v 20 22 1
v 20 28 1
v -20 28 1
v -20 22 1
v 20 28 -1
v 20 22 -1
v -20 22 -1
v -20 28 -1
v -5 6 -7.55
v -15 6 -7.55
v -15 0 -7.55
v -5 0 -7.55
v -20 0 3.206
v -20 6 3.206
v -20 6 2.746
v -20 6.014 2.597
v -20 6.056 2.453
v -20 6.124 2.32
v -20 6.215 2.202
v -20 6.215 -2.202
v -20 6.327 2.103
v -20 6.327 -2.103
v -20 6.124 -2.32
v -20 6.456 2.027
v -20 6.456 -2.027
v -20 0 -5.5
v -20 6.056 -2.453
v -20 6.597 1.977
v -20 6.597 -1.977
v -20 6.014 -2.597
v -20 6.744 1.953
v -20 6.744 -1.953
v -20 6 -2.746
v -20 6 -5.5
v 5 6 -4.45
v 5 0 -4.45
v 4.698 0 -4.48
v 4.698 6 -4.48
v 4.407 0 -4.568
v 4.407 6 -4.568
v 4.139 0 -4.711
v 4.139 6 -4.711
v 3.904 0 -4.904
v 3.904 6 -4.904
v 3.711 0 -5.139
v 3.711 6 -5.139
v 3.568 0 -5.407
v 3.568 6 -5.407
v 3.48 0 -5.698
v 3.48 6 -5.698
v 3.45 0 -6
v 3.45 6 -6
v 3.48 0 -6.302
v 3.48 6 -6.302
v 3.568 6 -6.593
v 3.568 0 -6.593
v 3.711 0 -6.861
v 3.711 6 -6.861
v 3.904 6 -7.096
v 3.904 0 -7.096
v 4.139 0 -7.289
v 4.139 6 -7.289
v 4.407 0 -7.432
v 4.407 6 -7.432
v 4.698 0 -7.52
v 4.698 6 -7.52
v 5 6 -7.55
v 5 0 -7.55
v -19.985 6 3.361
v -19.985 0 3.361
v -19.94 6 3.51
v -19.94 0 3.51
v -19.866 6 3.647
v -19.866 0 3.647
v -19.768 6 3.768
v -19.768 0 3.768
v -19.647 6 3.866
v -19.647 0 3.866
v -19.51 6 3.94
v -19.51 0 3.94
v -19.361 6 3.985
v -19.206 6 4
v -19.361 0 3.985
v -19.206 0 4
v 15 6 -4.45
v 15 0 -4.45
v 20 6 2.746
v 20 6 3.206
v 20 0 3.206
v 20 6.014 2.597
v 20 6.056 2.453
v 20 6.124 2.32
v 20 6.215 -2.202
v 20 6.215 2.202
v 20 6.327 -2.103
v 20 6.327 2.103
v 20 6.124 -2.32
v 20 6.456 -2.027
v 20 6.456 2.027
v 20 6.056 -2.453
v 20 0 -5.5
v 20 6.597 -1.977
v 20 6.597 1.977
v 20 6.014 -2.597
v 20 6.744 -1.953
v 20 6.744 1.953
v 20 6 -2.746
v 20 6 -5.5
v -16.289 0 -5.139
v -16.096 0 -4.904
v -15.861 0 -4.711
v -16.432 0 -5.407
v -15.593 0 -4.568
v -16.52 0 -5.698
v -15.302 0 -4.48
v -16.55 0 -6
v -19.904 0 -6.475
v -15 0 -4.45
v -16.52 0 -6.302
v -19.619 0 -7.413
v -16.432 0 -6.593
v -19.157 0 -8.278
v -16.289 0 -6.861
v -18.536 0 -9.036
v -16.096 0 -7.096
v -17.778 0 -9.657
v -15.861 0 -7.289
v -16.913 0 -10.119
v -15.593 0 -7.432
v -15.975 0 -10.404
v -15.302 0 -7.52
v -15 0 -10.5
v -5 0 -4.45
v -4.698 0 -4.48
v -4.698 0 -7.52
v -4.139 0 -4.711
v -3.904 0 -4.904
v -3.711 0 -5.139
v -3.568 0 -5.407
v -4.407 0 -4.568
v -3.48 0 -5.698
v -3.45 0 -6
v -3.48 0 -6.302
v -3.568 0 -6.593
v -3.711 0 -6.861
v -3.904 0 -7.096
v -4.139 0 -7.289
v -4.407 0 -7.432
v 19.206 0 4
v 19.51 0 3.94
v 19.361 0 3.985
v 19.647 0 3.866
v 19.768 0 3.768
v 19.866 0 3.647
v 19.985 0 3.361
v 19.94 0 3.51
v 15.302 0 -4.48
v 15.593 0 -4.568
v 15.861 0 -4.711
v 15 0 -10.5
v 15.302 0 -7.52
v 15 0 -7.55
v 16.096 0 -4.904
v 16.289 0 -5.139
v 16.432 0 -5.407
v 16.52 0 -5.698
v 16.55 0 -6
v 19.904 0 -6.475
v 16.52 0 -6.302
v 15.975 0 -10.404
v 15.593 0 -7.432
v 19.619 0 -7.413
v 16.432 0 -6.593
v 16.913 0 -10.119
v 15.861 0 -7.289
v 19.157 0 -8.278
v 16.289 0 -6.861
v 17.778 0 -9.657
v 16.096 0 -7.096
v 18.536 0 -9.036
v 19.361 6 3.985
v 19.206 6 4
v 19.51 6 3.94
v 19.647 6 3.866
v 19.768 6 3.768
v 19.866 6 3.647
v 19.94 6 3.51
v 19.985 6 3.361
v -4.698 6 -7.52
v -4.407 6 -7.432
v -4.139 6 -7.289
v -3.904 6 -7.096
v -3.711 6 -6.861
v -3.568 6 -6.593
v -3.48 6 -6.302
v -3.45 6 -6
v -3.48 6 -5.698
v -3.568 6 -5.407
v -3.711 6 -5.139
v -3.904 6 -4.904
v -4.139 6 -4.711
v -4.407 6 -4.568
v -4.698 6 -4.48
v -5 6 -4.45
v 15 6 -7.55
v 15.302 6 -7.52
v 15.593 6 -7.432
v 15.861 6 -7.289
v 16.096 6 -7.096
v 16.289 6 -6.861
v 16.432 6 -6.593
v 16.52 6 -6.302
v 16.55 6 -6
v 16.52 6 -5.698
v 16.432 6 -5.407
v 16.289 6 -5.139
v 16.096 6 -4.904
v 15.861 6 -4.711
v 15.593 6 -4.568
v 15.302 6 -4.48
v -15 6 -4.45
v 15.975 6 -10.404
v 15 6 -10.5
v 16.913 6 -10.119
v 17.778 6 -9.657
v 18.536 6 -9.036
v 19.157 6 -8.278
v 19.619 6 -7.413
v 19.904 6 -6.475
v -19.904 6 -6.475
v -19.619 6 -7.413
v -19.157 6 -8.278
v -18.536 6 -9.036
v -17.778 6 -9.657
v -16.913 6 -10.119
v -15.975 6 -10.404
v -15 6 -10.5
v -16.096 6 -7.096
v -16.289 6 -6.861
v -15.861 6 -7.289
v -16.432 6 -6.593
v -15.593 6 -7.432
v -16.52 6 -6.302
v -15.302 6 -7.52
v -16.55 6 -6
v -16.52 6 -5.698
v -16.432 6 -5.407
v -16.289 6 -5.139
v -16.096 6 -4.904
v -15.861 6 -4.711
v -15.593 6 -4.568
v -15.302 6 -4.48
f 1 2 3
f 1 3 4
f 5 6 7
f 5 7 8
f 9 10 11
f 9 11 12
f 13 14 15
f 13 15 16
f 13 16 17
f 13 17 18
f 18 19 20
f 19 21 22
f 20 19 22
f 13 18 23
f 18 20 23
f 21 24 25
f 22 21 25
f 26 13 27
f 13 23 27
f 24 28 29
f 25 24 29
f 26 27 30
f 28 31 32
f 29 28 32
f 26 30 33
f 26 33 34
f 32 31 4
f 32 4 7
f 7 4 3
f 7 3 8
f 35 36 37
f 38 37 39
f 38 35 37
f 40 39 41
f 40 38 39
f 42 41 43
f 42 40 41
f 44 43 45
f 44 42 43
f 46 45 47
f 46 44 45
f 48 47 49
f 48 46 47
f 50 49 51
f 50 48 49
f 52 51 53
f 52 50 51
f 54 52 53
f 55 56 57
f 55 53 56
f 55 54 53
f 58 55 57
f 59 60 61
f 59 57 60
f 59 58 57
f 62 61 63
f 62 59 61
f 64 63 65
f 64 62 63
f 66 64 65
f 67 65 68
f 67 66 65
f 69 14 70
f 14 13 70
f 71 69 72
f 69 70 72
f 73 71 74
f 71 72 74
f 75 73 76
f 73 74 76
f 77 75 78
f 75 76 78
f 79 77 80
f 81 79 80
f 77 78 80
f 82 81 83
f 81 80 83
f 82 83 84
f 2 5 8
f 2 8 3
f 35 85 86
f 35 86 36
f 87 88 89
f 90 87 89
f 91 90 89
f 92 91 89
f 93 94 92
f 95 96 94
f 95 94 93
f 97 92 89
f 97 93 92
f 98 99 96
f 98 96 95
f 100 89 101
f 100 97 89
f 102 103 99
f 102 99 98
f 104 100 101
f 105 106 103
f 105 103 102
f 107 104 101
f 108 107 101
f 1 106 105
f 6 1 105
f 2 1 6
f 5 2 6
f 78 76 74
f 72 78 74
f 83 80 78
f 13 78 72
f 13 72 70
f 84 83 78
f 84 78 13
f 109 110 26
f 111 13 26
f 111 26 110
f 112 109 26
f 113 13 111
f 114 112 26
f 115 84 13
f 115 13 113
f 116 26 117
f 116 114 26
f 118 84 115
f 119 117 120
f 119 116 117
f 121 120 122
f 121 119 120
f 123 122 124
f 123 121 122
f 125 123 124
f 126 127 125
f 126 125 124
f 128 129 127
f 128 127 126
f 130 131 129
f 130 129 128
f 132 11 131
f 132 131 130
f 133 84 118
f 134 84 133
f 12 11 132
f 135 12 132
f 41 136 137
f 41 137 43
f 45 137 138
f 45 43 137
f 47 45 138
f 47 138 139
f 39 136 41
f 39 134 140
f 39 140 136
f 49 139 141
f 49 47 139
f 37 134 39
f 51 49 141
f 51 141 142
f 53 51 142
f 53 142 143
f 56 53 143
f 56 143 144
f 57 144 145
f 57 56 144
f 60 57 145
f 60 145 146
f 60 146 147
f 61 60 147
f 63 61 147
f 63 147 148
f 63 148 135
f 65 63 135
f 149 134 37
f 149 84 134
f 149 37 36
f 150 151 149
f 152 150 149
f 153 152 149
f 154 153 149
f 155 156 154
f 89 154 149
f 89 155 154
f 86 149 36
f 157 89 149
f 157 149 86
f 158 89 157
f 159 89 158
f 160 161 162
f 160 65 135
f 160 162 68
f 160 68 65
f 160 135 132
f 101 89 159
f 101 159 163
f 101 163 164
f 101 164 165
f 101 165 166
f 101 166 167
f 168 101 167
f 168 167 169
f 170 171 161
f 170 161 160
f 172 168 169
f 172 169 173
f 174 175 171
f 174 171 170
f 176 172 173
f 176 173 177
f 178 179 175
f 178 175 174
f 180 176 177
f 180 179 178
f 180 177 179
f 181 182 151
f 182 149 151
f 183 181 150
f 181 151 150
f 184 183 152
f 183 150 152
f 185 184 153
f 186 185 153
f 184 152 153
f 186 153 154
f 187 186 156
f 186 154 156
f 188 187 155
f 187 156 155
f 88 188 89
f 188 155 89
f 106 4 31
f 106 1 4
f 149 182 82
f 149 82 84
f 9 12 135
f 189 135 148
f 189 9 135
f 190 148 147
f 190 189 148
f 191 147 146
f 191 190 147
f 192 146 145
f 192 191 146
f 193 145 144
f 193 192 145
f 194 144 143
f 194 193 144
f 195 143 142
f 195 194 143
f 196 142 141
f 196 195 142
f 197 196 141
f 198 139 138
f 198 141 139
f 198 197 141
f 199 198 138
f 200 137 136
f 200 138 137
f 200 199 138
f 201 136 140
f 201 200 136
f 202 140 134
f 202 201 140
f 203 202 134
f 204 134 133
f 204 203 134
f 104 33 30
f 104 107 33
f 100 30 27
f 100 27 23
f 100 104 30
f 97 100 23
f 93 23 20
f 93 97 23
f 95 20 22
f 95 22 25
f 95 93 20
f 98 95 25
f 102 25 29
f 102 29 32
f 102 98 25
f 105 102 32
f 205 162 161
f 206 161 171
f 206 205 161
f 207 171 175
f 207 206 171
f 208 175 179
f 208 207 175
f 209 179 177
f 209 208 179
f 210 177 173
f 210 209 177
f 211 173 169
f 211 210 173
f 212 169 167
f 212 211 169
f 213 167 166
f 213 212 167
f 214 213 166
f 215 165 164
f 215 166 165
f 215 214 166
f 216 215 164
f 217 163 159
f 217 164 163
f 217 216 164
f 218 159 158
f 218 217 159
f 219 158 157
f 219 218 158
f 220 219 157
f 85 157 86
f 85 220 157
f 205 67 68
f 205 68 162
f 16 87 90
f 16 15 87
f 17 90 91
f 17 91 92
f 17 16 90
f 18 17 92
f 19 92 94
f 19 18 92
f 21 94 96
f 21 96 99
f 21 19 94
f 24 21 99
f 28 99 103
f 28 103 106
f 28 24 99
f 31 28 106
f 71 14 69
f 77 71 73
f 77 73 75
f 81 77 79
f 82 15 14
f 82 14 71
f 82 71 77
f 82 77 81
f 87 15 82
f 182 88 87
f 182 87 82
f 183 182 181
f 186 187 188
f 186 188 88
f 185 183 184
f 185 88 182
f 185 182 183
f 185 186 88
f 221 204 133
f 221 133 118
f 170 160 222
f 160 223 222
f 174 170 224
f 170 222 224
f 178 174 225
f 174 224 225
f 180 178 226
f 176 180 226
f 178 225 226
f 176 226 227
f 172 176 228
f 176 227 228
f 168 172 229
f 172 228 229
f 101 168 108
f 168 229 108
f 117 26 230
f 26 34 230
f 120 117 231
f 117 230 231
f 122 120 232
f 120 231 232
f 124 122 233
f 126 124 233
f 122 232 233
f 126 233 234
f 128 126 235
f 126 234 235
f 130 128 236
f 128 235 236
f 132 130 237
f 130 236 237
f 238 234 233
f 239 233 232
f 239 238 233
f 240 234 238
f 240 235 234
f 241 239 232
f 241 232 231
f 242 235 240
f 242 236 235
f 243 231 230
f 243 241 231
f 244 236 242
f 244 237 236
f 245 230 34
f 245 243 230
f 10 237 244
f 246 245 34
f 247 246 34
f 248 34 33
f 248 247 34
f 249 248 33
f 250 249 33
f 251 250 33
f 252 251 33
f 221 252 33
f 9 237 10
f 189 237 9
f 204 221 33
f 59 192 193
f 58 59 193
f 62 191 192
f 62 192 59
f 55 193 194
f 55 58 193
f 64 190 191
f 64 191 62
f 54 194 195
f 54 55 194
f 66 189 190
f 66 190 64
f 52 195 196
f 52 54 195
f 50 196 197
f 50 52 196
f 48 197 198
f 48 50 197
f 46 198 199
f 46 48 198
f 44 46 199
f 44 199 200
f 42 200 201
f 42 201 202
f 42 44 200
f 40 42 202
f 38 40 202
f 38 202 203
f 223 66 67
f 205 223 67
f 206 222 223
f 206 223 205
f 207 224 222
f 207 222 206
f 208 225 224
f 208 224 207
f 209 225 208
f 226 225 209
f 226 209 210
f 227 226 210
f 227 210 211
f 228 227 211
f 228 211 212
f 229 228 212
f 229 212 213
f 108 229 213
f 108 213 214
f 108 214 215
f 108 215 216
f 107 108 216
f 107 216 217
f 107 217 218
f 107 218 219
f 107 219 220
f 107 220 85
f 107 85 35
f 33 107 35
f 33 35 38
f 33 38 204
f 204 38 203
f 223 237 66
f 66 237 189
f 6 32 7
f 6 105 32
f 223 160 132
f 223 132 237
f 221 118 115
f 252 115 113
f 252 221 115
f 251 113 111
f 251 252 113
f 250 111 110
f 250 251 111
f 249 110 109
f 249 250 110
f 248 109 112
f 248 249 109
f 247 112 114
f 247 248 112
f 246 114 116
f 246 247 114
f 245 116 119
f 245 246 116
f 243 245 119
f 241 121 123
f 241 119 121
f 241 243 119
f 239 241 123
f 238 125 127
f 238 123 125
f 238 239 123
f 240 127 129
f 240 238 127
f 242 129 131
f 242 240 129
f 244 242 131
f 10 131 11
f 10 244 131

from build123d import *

# Parameters (mm, degrees)
BOSS_EXTRUDE1_DEPTH = 20
CUT_EXTRUDE1_REACH  = 33.532
FILLET1_R           = 5
FILLET2_R           = 0.79375


with BuildPart() as part:
    # Sketch1 → Boss-Extrude1 (new, symmetric)
    with BuildSketch(Plane(origin=(0, 0, 0), x_dir=(0, 0, -1), z_dir=(1, 0, 0))):
        Polygon((-4, 0), (10.5, 0), (10.5, 6), (2, 6), (1, 22), (1, 28), (-1, 28), (-1, 22), (-2, 6), (-4, 6), align=None)
    extrude(amount=BOSS_EXTRUDE1_DEPTH, both=True)

    # Sketch4 → Cut-Extrude1 (cut, up to next)
    with BuildSketch(Plane(origin=(0, 6, 0), x_dir=(1, 0, 0), z_dir=(0, 1, 0)), mode=Mode.PRIVATE) as cut_extrude1_sk1:
        with BuildLine():
            Line((-15, 7.55), (-5, 7.55))
            ThreePointArc((-5, 7.55), (-3.45, 6), (-5, 4.45))
            Line((-5, 4.45), (-15, 4.45))
            ThreePointArc((-15, 4.45), (-16.55, 6), (-15, 7.55))
        make_face()
    cut_extrude1_tool1 = extrude(cut_extrude1_sk1.sketch, amount=-CUT_EXTRUDE1_REACH, mode=Mode.PRIVATE) & part.part
    # Sketch4 → Cut-Extrude1 (cut, up to next)
    with BuildSketch(Plane(origin=(0, 6, 0), x_dir=(1, 0, 0), z_dir=(0, 1, 0)), mode=Mode.PRIVATE) as cut_extrude1_sk2:
        with BuildLine():
            Line((5, 7.55), (15, 7.55))
            ThreePointArc((15, 7.55), (16.55, 6), (15, 4.45))
            Line((15, 4.45), (5, 4.45))
            ThreePointArc((5, 4.45), (3.45, 6), (5, 7.55))
        make_face()
    cut_extrude1_tool2 = extrude(cut_extrude1_sk2.sketch, amount=-CUT_EXTRUDE1_REACH, mode=Mode.PRIVATE) & part.part
    add(cut_extrude1_tool1.solids().sort_by_distance((-10, 6, -6))[0], mode=Mode.SUBTRACT)
    add(cut_extrude1_tool2.solids().sort_by_distance((10, 6, -6))[0], mode=Mode.SUBTRACT)

    # Fillet1
    fillet1_edges = [part.edges().sort_by_distance(p)[0] for p in [
        (20, 3, -10.5),
        (-20, 3, -10.5),
    ]]
    fillet(fillet1_edges, radius=FILLET1_R)

    # Fillet2
    fillet2_edges = [part.edges().sort_by_distance(p)[0] for p in [
        (-20, 3, 4),
        (0, 6, 2),
        (0, 22, 1),
        (0, 22, -1),
        (0, 6, -2),
        (20, 3, 4),
    ]]
    fillet(fillet2_edges, radius=FILLET2_R)


solid = part.part
